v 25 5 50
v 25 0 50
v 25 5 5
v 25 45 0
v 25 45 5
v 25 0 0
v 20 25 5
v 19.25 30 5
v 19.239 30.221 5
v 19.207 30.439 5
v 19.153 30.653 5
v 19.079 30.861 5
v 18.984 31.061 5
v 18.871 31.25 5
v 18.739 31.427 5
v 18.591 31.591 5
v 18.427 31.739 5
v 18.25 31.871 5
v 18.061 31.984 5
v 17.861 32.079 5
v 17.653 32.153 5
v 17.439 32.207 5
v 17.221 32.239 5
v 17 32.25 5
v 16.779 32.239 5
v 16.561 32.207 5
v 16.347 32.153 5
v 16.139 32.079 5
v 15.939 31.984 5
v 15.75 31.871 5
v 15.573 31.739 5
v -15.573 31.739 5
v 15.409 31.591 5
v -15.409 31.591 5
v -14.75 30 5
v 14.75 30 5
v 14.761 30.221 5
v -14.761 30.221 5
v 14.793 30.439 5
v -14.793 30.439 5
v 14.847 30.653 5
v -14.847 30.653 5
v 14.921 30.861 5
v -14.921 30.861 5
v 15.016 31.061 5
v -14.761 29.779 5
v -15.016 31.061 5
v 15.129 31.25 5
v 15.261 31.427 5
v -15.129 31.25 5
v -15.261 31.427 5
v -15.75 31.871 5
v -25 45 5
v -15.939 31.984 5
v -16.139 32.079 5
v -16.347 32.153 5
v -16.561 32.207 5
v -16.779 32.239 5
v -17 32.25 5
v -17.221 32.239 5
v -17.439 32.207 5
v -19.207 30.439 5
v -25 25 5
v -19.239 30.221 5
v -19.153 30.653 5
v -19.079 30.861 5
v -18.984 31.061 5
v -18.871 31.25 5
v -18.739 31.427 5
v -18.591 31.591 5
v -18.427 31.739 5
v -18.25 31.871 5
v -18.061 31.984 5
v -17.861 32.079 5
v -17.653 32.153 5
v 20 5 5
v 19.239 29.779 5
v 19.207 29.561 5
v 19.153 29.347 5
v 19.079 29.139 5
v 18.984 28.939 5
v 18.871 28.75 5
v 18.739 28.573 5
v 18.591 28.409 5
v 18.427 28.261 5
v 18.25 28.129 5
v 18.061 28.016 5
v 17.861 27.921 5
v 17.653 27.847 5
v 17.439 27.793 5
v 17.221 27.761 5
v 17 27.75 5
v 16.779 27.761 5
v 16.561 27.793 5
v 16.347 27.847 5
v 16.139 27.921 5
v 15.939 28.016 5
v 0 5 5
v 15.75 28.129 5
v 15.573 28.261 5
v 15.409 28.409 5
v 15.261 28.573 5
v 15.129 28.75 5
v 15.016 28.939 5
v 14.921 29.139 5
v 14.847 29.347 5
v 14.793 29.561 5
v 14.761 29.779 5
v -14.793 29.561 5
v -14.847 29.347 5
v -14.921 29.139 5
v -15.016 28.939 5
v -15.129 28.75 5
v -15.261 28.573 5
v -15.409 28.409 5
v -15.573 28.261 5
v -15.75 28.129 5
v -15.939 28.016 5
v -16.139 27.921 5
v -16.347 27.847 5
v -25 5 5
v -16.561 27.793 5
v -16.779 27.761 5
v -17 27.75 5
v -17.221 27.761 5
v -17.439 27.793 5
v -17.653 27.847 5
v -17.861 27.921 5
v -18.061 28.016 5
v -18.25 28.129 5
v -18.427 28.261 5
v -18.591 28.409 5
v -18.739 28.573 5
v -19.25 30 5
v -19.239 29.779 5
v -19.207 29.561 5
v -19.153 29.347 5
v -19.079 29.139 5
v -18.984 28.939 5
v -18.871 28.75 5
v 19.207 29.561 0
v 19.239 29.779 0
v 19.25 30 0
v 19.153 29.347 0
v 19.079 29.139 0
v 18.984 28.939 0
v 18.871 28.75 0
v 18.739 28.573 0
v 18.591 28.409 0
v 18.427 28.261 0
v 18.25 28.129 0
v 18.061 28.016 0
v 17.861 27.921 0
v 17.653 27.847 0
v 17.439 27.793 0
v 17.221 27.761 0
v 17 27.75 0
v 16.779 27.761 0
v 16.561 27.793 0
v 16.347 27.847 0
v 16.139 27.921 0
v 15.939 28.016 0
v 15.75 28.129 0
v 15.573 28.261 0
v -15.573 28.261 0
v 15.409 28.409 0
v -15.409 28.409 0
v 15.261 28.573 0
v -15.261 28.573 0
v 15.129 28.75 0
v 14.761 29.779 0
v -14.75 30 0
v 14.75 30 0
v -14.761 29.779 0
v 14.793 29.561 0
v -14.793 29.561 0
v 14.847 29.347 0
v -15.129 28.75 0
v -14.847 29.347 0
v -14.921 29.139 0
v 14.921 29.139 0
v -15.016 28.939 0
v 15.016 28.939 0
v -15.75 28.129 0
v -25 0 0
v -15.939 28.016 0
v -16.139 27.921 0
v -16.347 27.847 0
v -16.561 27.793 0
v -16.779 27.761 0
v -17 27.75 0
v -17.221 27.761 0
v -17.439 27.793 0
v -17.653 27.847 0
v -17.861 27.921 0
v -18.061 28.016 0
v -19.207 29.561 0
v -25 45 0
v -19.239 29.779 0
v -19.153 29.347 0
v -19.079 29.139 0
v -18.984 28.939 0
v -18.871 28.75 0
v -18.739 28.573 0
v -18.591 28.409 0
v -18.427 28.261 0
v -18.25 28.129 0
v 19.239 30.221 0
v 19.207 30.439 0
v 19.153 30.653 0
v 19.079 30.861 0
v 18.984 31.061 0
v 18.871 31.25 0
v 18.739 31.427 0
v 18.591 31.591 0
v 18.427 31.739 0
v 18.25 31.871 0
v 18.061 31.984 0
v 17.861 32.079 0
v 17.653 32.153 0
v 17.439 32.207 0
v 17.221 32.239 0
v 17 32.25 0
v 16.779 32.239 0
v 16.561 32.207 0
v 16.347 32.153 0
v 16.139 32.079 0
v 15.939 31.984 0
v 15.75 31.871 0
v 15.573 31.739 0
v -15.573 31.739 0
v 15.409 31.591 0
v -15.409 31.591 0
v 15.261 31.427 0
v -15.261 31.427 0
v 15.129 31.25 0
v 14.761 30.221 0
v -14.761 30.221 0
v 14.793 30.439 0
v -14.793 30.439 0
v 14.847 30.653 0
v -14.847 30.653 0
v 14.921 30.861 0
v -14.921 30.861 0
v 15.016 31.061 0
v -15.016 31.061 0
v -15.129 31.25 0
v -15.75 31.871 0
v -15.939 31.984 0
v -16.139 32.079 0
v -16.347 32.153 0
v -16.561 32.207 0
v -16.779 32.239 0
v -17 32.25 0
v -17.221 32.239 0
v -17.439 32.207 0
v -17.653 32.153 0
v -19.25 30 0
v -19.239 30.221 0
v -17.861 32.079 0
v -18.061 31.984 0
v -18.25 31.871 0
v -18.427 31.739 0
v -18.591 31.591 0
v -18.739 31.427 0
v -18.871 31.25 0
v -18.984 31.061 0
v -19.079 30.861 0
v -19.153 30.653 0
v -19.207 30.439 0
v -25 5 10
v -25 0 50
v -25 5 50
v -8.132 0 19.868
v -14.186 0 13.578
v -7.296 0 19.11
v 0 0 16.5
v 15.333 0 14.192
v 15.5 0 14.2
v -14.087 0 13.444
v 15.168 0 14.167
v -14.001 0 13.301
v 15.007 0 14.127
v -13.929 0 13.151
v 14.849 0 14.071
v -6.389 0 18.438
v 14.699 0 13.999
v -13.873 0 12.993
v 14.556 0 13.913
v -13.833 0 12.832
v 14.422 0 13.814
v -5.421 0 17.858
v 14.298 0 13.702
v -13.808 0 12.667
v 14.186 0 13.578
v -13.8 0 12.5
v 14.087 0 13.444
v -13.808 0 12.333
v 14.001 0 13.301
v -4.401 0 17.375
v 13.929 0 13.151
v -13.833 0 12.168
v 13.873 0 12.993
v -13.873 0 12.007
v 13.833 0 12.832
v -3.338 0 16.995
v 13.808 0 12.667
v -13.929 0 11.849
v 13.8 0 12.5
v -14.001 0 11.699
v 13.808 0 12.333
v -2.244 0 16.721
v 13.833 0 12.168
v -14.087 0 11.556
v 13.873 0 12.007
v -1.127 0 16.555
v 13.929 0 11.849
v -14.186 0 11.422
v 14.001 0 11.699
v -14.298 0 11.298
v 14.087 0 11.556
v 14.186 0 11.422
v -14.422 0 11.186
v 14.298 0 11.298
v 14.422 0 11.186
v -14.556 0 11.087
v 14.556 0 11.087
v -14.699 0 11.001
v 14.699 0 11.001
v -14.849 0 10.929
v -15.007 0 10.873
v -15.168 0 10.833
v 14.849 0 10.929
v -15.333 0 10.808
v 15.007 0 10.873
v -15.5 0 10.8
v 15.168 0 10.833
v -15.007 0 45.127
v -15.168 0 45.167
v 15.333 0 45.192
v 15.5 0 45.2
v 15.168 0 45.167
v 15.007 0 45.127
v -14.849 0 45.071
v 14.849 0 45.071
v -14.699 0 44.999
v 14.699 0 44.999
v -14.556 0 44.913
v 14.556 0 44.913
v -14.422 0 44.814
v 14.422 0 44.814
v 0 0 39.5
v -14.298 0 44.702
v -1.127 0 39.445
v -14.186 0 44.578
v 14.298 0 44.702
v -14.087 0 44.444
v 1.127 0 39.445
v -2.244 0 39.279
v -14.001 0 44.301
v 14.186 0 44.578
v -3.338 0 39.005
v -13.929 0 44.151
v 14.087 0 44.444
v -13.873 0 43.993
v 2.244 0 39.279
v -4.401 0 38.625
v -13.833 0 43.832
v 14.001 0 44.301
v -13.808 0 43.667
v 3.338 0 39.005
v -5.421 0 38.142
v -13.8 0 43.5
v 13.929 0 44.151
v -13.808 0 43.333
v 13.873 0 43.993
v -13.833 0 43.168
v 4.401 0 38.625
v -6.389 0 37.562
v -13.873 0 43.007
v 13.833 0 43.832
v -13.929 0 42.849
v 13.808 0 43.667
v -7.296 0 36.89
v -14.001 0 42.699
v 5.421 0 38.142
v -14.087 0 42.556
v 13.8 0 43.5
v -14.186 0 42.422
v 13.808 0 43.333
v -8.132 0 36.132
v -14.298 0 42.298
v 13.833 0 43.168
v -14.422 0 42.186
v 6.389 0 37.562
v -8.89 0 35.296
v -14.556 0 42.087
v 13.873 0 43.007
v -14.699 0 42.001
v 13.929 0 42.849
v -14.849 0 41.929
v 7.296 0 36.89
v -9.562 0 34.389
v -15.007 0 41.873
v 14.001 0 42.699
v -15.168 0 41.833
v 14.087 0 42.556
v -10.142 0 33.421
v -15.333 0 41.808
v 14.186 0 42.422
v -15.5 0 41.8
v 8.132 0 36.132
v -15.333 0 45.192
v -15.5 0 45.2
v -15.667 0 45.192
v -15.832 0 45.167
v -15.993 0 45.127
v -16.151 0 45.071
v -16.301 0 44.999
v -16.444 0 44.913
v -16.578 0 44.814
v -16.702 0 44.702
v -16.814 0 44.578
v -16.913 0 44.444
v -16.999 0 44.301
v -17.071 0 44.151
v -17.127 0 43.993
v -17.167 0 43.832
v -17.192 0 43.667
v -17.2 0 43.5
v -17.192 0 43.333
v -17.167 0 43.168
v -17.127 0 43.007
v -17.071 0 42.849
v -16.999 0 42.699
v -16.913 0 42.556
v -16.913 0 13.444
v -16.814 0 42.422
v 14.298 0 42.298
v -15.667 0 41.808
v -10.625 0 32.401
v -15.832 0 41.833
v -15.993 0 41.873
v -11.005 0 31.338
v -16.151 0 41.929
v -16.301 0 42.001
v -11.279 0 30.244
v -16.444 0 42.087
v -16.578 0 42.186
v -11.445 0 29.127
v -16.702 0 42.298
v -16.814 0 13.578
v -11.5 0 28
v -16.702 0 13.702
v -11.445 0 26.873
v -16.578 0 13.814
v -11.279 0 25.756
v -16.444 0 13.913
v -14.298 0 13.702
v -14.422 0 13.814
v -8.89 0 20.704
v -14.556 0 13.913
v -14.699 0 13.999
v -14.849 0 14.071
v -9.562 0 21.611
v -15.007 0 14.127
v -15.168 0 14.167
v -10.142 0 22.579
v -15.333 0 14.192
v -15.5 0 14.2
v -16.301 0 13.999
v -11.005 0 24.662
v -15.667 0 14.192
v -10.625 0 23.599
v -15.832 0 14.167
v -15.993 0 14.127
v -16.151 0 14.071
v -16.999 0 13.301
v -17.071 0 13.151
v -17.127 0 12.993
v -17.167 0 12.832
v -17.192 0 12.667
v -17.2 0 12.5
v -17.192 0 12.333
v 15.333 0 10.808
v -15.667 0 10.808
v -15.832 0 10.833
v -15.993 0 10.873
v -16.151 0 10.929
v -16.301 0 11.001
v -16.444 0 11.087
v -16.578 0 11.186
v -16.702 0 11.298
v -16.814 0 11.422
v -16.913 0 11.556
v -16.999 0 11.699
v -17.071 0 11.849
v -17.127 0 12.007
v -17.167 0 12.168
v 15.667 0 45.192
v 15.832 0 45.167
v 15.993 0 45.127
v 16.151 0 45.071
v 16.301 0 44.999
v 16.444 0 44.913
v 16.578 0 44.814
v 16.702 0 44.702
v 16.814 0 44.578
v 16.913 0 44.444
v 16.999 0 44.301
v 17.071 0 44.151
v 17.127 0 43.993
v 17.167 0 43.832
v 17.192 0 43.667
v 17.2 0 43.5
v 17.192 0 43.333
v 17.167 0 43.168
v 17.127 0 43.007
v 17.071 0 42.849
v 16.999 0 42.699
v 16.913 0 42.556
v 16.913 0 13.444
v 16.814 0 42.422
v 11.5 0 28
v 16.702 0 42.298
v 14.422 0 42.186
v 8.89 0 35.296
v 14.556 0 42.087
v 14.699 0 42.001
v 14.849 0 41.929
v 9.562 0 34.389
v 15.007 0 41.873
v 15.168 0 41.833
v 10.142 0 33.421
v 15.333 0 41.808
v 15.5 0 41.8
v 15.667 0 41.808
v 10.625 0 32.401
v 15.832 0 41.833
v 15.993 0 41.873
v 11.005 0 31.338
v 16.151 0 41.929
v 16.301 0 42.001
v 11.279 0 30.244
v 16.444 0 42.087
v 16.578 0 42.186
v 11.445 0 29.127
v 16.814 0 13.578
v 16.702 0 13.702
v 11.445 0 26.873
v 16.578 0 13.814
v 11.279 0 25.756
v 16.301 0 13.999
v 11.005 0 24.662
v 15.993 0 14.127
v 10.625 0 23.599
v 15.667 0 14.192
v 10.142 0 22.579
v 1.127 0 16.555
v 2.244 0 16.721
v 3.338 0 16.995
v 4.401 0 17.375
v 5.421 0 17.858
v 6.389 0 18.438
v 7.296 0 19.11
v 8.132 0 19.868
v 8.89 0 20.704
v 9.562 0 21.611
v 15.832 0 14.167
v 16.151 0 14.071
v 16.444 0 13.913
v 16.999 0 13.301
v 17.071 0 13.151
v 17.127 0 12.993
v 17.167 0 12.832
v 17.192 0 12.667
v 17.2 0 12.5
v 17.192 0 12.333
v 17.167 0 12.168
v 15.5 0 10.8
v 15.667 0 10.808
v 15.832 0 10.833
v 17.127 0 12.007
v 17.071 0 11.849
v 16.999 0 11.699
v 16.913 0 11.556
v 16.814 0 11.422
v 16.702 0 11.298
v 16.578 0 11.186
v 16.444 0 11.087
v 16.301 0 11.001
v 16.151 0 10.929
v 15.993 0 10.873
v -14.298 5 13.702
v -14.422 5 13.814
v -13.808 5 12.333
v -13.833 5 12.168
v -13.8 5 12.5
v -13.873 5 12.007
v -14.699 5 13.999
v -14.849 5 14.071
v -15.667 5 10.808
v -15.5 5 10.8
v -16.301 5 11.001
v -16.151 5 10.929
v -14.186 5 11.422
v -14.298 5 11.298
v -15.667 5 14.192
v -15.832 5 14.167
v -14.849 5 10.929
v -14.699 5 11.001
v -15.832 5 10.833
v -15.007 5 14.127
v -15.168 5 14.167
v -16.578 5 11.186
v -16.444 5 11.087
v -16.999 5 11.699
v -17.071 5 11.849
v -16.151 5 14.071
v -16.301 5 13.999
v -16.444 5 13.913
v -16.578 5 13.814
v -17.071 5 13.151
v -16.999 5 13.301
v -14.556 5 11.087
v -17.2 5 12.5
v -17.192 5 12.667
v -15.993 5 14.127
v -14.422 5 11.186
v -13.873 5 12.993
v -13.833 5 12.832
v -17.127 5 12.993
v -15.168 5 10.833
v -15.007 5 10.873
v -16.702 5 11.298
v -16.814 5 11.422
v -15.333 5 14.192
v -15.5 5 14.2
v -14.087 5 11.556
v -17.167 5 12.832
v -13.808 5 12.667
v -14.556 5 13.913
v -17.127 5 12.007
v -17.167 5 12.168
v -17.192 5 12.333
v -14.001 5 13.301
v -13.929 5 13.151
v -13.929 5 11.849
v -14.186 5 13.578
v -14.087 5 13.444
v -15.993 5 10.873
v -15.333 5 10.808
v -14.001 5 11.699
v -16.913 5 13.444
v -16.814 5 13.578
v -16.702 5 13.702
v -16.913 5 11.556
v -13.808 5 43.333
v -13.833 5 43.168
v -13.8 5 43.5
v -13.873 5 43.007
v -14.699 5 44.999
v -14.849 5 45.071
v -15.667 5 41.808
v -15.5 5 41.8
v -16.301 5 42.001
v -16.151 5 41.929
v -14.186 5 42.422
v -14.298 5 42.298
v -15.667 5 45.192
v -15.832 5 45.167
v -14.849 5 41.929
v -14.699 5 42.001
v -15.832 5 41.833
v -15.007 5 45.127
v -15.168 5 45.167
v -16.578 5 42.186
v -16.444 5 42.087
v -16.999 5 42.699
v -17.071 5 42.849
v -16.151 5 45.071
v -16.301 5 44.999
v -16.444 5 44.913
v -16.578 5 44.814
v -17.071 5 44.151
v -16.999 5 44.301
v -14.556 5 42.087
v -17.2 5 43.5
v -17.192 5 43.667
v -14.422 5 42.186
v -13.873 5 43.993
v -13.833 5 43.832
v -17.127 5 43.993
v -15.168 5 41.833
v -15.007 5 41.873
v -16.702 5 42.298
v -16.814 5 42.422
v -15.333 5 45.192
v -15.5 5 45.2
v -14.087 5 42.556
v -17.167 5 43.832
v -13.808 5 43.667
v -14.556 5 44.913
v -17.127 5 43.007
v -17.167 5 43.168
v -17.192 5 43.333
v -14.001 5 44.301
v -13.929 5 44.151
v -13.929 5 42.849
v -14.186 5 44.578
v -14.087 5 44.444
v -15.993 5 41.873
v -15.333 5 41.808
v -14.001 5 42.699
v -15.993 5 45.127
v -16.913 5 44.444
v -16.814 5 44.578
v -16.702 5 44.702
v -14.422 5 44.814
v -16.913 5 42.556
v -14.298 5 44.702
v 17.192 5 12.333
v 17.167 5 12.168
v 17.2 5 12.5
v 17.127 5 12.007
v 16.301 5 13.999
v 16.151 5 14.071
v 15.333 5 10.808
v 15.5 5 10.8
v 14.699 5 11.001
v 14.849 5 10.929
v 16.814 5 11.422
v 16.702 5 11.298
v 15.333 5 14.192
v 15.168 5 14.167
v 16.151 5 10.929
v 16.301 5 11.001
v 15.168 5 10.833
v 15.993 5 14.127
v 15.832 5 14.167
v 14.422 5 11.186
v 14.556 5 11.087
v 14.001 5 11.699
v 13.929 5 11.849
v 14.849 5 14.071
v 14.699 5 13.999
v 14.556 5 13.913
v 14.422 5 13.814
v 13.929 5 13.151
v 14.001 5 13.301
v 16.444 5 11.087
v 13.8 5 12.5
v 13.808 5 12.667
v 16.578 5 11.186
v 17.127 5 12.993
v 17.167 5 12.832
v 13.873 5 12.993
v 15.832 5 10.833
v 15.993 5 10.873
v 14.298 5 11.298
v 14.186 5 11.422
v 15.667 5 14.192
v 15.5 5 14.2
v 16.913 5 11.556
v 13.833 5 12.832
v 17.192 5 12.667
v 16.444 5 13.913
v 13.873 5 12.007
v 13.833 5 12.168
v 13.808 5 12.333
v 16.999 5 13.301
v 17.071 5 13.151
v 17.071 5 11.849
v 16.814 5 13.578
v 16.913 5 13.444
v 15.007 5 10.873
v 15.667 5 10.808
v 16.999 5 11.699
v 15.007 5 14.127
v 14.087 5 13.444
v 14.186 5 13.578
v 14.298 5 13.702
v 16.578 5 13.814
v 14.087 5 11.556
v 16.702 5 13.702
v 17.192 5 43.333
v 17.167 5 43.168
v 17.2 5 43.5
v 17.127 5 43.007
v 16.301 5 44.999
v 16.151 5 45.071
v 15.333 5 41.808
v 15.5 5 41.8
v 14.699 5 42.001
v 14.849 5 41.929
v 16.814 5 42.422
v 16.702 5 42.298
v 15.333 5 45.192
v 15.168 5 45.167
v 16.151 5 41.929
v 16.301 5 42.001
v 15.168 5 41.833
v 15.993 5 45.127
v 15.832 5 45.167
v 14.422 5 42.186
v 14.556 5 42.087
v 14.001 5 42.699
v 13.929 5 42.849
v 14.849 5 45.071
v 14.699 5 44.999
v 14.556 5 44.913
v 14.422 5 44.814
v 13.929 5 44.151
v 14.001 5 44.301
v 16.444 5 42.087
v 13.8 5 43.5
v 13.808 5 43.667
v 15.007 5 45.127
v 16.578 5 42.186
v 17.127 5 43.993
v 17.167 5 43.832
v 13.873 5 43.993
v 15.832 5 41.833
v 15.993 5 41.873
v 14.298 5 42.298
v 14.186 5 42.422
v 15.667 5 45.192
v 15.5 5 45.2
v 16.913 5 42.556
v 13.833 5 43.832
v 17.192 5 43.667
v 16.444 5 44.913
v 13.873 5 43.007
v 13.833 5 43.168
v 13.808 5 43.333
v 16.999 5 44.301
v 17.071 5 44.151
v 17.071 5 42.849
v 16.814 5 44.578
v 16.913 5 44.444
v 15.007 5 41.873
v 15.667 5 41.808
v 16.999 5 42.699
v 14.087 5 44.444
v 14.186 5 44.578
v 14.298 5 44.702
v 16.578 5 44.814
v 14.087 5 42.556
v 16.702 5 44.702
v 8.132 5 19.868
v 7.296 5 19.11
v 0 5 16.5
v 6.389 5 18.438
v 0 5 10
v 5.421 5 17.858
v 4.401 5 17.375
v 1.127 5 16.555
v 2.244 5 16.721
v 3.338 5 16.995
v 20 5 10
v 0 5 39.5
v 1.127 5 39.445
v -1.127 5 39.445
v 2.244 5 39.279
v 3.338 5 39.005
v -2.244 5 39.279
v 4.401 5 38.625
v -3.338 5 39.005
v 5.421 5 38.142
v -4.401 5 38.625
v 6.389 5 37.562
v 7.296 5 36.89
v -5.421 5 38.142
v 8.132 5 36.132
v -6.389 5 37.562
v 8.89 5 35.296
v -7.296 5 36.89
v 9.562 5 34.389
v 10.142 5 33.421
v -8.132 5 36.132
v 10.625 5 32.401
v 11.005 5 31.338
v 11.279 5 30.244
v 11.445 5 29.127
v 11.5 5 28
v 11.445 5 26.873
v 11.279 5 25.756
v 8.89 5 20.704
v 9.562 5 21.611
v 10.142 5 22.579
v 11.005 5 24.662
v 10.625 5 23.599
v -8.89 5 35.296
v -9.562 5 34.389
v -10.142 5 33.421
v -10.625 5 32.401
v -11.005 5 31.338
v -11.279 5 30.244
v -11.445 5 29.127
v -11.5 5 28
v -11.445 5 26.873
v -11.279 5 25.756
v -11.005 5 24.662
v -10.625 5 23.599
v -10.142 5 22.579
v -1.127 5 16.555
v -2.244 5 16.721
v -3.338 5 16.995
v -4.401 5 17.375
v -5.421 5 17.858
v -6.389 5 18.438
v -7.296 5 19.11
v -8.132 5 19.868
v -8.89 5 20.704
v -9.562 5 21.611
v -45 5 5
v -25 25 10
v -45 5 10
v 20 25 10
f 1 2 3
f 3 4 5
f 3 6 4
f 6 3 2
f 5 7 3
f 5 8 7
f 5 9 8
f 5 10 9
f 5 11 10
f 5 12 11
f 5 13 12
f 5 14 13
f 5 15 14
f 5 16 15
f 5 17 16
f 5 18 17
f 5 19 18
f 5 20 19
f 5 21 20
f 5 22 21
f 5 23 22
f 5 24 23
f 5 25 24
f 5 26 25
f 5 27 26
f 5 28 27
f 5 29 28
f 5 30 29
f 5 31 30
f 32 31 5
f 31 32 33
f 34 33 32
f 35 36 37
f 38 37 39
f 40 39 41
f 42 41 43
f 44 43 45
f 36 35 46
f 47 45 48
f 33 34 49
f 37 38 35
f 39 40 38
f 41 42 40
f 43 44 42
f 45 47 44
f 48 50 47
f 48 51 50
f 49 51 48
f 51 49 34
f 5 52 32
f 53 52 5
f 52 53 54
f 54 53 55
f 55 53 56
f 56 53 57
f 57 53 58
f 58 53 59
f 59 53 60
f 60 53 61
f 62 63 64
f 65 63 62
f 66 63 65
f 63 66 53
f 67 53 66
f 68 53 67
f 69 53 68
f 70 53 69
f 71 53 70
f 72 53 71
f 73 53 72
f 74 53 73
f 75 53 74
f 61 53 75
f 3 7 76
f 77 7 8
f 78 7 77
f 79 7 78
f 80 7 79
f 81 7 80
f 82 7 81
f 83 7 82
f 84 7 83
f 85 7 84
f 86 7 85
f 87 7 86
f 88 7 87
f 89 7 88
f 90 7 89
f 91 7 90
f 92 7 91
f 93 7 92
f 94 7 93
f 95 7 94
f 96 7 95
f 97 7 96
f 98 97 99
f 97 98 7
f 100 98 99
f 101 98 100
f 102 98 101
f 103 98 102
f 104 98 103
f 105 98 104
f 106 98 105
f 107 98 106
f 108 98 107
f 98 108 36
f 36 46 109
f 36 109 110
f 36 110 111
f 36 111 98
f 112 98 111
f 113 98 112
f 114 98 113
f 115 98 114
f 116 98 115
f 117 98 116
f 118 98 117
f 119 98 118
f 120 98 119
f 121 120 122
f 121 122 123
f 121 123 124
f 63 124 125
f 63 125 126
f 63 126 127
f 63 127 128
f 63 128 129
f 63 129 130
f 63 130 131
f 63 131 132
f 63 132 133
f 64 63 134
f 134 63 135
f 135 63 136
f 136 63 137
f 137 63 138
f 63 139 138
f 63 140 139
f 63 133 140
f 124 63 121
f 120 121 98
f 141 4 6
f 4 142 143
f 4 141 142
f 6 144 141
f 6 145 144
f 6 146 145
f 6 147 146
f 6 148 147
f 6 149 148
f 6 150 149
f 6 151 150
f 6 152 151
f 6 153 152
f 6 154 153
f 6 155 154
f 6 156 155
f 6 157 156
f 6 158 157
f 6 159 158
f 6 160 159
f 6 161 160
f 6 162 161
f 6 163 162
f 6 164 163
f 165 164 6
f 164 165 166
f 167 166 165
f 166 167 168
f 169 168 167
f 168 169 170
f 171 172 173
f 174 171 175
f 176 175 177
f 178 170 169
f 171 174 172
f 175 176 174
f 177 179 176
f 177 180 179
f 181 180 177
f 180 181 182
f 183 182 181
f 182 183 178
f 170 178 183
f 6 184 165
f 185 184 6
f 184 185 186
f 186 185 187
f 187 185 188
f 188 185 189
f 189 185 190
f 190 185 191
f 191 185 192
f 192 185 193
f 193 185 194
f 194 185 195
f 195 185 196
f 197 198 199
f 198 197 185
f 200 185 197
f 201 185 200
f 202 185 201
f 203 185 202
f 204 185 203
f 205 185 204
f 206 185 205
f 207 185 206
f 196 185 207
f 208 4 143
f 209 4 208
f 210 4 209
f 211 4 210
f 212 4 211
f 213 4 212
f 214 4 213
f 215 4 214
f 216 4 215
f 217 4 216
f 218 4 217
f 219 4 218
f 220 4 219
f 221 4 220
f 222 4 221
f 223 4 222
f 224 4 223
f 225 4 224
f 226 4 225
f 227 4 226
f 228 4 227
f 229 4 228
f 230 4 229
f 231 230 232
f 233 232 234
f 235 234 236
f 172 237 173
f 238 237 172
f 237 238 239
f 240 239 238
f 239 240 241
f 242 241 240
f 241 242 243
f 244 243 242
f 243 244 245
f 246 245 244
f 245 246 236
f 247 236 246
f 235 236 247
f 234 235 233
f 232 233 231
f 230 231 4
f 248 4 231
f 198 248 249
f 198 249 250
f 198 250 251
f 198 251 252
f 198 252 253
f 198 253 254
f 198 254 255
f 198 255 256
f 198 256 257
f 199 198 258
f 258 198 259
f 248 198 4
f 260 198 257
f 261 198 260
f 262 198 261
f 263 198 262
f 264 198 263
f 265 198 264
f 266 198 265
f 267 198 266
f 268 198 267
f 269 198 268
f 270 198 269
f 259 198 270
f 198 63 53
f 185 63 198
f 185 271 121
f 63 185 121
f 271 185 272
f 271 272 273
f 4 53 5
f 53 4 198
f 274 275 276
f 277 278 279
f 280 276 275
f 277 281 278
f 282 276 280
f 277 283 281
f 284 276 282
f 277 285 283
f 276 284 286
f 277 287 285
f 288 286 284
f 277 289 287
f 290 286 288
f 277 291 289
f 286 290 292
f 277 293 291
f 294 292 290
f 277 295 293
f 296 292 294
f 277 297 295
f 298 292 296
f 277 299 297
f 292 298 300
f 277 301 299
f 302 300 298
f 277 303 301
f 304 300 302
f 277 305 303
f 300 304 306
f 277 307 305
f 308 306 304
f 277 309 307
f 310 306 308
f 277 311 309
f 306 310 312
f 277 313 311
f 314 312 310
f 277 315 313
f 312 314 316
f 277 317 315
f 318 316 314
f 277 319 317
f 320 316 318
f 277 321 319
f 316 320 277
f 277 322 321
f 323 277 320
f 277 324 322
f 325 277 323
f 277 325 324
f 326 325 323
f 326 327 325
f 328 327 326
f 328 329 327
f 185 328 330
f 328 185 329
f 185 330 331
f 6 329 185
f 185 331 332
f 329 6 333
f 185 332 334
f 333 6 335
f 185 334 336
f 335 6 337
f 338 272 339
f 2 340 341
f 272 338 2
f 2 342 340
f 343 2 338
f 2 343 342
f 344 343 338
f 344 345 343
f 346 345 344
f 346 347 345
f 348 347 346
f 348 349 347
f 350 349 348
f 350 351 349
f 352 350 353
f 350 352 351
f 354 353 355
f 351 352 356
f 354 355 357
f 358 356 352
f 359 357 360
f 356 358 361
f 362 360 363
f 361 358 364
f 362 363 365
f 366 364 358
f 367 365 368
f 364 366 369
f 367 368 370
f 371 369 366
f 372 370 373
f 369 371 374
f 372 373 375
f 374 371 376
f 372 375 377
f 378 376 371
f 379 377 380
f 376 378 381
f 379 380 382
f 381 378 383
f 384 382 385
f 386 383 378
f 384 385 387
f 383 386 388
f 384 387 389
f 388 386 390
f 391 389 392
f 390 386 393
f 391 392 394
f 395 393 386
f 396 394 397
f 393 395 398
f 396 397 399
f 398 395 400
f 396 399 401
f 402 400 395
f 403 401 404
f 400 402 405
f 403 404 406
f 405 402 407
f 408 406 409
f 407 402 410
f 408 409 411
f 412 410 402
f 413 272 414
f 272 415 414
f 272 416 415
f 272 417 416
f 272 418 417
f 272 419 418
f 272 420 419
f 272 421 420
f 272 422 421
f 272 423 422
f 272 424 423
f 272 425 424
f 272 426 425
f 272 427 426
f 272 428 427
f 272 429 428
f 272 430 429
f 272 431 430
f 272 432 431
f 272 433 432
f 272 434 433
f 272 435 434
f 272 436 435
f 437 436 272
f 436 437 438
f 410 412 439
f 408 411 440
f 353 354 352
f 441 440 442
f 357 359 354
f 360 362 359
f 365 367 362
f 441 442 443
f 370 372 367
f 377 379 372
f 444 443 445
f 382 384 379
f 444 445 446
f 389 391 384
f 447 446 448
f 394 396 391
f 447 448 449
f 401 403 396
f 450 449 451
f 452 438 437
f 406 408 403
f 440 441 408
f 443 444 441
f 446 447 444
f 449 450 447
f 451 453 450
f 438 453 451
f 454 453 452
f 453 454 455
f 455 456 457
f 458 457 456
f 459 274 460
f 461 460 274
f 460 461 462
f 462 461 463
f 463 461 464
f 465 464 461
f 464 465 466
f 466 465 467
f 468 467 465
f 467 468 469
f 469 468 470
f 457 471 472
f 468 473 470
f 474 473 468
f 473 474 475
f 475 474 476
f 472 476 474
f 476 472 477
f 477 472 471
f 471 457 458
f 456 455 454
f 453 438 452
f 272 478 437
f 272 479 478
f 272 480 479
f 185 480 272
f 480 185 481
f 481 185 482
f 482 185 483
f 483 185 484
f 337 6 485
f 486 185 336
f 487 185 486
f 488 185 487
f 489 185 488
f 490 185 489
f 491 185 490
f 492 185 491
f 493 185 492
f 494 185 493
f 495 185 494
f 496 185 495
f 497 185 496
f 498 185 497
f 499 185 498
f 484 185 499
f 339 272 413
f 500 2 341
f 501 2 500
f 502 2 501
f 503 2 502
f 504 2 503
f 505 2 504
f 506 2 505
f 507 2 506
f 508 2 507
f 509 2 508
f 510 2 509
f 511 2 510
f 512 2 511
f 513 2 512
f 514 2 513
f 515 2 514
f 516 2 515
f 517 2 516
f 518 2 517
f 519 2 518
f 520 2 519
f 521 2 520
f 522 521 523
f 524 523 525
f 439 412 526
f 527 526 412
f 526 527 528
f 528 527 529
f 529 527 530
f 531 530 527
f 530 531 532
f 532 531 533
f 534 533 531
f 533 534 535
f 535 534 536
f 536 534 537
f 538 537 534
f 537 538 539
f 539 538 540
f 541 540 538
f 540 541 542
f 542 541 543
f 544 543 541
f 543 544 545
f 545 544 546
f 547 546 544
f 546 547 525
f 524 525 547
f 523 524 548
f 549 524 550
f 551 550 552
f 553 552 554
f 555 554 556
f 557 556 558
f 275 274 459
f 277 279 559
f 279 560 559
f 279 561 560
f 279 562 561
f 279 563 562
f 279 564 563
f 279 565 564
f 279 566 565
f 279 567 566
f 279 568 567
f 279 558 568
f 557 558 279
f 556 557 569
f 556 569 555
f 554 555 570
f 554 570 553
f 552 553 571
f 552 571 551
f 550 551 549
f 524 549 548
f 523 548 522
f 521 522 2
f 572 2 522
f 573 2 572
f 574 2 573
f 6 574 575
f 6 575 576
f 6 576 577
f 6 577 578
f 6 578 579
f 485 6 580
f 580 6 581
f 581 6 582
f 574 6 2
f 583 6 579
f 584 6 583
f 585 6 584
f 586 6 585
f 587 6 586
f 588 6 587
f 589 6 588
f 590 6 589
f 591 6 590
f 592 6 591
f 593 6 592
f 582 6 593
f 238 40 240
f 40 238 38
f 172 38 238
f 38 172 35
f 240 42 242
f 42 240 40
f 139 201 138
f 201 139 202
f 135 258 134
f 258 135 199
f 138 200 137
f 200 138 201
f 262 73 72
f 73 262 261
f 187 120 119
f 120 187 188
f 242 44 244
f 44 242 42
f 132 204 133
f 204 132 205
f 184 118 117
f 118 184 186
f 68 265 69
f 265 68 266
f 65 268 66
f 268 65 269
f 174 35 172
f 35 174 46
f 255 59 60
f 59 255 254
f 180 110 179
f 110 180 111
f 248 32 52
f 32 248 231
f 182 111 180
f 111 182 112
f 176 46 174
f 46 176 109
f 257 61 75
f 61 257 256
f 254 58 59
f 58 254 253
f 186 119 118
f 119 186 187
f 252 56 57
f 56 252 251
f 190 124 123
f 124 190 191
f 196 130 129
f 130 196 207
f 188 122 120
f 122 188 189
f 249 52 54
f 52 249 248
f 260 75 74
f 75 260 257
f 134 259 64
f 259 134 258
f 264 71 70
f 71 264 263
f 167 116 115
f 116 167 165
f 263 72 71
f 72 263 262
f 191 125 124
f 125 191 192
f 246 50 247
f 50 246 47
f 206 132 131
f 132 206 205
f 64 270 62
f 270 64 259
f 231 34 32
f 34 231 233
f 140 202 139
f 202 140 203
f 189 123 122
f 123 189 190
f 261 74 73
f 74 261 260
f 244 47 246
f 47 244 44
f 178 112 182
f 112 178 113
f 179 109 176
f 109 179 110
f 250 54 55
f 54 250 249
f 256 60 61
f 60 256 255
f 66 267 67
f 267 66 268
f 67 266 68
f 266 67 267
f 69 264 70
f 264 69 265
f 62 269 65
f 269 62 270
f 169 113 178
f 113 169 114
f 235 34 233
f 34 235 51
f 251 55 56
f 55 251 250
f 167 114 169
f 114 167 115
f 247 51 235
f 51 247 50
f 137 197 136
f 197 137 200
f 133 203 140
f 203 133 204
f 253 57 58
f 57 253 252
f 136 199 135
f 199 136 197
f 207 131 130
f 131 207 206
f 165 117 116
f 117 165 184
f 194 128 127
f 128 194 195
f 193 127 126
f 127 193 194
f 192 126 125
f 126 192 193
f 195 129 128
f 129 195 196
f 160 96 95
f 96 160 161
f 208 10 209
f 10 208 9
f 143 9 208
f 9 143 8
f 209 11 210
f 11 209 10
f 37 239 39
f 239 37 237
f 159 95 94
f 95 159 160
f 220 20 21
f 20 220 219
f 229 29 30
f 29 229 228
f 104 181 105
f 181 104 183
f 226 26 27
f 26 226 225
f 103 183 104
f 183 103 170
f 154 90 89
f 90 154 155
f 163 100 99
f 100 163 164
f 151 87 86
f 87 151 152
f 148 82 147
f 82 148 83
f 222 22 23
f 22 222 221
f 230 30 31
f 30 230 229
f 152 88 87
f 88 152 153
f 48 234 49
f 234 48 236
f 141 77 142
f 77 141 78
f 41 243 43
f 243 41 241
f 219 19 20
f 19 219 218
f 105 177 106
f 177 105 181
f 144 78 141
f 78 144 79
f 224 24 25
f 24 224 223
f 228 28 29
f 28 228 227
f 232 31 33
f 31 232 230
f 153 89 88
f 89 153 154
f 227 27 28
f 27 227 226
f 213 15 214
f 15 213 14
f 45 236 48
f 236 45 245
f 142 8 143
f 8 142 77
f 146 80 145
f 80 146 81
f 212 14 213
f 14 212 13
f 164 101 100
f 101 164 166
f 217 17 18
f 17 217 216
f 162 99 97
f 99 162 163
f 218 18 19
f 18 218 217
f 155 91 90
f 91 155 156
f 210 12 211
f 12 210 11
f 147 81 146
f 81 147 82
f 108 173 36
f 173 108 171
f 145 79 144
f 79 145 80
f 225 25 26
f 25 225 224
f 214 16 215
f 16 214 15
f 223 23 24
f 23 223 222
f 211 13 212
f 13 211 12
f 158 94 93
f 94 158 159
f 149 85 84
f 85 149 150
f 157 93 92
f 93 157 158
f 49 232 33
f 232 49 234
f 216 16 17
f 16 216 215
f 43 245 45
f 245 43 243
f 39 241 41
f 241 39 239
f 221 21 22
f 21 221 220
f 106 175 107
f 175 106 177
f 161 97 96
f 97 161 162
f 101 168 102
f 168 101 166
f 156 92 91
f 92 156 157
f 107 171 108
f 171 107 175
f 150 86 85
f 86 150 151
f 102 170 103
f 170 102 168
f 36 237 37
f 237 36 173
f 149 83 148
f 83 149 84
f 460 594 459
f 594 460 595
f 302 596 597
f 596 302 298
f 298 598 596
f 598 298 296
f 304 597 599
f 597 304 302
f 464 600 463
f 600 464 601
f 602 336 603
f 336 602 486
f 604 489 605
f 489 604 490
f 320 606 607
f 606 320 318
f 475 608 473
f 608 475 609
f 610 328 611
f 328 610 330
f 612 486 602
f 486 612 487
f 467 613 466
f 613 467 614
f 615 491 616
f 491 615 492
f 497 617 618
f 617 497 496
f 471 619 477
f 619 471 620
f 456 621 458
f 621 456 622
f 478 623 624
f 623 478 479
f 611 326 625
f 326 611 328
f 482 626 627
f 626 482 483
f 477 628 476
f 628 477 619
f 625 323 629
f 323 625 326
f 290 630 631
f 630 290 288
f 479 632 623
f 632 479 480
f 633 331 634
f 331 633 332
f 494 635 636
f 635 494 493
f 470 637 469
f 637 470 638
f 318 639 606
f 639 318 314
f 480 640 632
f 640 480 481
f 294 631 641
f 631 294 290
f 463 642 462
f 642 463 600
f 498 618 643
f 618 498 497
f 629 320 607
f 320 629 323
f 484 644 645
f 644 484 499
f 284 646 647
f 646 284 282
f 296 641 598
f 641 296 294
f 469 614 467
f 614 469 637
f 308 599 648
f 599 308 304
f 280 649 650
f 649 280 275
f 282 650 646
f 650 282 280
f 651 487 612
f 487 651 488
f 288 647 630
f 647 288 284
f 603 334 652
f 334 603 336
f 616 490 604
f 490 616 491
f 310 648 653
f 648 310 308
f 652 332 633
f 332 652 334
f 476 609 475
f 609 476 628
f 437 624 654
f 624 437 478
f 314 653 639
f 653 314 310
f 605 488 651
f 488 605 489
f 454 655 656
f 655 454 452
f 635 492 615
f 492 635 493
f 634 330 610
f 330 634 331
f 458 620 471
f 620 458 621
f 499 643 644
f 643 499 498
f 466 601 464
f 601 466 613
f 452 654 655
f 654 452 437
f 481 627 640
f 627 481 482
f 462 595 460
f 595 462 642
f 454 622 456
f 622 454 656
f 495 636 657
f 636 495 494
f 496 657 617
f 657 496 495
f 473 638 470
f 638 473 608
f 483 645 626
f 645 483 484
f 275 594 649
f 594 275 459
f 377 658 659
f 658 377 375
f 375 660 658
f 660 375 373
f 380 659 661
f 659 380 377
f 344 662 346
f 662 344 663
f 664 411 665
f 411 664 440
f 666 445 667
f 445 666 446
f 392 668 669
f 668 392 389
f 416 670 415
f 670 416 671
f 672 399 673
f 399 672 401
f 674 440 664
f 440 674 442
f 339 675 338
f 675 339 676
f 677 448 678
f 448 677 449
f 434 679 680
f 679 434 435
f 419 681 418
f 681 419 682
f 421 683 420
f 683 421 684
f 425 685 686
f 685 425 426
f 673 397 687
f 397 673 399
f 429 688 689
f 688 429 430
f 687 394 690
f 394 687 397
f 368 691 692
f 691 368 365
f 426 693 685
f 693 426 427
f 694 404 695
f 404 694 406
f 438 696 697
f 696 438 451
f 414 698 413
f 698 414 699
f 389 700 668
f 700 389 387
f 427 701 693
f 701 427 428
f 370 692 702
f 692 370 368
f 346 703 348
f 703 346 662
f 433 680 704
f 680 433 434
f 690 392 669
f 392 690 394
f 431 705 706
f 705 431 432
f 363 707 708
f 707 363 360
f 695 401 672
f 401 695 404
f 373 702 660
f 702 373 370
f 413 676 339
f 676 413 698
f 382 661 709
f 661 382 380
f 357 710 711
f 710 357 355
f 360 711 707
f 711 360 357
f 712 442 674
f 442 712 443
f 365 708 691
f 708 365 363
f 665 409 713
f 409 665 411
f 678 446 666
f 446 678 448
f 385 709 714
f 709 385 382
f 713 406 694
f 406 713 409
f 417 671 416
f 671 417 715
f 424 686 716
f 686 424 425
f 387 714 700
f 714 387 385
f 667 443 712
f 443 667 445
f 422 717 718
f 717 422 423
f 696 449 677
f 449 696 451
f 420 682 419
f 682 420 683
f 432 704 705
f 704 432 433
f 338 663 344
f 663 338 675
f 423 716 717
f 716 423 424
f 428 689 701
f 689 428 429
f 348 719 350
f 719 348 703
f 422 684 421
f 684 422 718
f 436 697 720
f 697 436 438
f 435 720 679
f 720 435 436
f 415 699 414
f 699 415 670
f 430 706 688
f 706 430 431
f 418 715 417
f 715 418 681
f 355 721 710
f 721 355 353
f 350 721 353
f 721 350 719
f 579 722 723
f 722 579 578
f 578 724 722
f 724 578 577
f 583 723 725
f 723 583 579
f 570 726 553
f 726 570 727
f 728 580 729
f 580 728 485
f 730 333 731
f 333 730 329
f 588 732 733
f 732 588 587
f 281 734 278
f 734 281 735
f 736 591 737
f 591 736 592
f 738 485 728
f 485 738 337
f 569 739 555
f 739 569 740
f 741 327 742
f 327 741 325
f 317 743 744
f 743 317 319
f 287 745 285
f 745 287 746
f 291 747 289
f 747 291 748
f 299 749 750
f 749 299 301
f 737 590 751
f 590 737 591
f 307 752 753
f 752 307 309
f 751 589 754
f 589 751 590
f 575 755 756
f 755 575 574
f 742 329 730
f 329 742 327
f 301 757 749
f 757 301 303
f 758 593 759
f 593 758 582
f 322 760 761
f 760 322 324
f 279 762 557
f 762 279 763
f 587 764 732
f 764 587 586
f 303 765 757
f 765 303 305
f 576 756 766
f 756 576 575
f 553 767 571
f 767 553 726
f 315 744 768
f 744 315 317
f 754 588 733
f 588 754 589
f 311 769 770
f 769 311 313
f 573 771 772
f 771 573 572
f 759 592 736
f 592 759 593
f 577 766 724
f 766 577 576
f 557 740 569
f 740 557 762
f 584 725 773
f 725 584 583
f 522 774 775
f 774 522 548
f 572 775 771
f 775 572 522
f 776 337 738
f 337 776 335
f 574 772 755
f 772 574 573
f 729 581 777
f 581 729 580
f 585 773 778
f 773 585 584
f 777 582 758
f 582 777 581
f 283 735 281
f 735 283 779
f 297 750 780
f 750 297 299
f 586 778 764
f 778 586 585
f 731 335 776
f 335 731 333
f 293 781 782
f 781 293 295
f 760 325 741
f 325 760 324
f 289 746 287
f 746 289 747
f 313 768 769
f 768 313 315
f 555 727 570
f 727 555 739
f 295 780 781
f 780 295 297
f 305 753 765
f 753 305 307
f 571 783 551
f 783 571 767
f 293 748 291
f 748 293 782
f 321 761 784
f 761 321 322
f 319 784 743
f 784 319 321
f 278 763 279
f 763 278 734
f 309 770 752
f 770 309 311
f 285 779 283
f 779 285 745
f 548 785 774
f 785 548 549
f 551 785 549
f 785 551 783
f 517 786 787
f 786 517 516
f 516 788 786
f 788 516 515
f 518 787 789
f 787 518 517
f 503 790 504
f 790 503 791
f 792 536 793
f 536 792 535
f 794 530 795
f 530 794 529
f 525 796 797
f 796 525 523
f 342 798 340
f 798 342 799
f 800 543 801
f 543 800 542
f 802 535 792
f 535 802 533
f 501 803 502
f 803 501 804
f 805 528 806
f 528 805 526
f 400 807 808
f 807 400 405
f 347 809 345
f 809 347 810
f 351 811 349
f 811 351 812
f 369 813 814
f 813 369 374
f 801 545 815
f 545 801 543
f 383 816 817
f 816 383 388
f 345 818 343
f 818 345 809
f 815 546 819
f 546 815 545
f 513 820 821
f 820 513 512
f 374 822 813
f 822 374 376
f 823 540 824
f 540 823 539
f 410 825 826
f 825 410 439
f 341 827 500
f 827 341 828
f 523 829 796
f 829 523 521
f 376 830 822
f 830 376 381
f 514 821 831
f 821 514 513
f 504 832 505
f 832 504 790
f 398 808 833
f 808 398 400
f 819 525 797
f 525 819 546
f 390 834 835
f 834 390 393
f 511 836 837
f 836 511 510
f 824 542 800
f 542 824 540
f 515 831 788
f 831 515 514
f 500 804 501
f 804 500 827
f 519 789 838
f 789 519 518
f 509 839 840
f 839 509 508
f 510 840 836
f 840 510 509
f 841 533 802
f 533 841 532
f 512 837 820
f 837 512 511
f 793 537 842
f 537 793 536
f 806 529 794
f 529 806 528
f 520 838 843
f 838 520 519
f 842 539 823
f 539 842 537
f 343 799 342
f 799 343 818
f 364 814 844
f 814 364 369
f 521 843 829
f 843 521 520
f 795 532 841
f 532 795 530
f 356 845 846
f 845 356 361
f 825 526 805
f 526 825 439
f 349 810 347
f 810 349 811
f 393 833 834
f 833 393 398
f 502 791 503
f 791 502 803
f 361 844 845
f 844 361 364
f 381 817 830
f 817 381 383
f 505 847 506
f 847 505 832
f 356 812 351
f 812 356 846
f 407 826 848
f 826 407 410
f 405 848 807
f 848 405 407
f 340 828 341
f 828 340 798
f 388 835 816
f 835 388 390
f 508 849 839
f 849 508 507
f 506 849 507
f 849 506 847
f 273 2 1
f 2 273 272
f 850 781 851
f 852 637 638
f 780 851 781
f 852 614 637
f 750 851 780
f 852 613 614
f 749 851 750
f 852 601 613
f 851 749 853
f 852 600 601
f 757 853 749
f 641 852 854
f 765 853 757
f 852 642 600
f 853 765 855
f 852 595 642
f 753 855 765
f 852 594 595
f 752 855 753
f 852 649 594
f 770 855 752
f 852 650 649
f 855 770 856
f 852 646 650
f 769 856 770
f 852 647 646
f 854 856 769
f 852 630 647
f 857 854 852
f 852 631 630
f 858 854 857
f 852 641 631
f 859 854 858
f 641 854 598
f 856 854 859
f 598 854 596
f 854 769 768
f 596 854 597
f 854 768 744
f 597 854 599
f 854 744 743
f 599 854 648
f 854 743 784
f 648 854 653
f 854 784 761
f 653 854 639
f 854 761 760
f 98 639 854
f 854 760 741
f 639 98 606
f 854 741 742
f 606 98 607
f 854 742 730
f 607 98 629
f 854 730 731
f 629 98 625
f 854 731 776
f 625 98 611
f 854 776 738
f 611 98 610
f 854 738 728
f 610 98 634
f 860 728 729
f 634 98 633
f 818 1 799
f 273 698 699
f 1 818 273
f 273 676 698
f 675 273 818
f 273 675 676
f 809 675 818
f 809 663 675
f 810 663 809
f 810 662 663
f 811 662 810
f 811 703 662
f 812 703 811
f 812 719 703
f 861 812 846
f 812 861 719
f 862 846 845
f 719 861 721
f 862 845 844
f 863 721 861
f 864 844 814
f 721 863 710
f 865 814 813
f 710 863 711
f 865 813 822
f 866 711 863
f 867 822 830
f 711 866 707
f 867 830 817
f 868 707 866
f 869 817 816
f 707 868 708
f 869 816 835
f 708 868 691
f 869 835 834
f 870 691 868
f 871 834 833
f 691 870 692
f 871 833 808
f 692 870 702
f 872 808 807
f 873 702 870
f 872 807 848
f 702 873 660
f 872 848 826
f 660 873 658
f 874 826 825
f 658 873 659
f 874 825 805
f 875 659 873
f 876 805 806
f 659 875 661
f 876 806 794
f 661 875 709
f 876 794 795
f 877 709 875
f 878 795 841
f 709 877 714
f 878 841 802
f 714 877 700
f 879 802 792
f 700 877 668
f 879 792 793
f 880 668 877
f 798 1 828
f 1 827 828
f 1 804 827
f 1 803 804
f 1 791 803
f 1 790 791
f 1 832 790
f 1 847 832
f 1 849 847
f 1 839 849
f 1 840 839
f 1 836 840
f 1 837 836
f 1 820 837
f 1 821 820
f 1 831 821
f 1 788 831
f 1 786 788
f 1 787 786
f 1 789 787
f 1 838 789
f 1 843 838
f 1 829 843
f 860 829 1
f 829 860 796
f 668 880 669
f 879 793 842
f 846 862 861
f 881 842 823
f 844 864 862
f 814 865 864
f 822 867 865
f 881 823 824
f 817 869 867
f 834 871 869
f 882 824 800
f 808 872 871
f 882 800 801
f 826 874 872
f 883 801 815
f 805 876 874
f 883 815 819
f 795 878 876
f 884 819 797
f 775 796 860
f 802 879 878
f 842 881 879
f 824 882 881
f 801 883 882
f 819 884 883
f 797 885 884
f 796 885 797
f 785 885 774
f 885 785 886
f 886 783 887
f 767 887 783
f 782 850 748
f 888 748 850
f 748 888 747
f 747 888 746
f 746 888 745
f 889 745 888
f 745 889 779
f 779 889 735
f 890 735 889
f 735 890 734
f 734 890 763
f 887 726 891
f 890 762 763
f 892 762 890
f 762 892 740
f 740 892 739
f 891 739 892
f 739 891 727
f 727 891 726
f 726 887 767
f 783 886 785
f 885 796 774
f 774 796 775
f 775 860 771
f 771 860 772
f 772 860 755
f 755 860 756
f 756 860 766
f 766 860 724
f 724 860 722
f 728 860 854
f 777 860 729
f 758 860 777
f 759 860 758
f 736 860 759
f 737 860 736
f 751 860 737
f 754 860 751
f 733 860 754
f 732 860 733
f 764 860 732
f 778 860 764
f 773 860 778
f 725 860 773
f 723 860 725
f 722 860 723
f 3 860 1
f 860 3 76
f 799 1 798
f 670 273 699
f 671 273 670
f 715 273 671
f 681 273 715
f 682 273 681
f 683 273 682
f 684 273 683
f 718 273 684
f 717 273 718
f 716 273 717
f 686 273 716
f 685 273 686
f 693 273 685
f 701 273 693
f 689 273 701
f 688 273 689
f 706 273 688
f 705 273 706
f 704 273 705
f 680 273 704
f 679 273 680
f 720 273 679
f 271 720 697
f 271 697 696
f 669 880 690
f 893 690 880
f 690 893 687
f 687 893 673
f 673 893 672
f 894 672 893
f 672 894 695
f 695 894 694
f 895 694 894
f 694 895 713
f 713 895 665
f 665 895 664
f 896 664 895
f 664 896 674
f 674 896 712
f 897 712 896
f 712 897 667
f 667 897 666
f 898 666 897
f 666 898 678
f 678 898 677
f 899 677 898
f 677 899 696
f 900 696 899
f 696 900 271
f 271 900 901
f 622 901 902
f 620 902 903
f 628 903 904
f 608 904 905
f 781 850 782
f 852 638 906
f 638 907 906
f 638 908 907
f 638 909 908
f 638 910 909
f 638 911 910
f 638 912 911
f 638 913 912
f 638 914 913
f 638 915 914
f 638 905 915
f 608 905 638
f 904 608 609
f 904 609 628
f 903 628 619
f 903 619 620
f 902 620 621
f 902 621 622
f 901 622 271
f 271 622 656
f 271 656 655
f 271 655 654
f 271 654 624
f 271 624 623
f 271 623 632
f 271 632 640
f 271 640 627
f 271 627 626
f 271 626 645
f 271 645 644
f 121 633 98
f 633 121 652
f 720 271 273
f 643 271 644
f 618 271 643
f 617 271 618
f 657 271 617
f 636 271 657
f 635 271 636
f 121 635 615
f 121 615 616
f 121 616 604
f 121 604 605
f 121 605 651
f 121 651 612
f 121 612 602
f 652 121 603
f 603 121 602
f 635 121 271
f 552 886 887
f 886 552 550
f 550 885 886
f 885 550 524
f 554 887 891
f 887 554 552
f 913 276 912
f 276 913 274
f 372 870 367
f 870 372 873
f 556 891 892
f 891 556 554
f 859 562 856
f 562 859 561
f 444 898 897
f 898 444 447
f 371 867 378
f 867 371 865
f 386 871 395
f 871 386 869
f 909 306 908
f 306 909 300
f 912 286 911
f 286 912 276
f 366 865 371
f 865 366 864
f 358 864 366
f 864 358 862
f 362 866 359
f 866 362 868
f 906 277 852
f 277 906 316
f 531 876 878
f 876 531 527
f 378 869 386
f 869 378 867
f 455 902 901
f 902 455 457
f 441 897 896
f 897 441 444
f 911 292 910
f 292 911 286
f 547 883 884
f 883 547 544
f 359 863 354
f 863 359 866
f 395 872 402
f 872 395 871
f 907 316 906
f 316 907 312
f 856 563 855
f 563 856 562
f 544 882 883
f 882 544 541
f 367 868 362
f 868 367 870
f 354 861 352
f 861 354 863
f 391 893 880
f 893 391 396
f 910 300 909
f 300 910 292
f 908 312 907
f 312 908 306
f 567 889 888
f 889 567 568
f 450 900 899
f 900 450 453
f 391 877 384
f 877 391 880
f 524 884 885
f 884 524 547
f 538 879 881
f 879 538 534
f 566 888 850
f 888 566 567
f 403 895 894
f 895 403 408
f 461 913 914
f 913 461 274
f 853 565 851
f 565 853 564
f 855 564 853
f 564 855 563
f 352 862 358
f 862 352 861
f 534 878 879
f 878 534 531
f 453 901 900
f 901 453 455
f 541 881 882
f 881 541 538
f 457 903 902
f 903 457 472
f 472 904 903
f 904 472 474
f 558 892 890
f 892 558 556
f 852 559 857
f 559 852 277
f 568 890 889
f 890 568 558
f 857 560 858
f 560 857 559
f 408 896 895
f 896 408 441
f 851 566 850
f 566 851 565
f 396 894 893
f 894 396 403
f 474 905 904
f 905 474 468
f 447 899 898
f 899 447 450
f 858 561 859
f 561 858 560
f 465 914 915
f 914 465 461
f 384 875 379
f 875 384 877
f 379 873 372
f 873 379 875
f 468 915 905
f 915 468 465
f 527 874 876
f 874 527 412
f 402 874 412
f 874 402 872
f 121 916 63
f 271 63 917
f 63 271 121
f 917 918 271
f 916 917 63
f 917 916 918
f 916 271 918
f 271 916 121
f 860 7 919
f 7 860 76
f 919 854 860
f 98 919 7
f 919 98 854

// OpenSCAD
// L-Shaped NEMA 17 Motor Bracket for Syringe Pump
// Print Orientation: Base plate on XY plane (Z=0)

// --- Dimensions ---
// Base Plate
base_width_x = 50;           // From -25 to 25
base_depth_y = 45;           // From 0 to 45
base_height_z = 5;           // Thickness of base
base_hole_dia = 4.5;         // M4 through-holes
base_hole_x1 = -17;          // X position of hole 1
base_hole_x2 = 17;           // X position of hole 2
base_hole_y = 30;            // Y position of holes

// Vertical Motor Plate
motor_plate_width_x = 50;    // From -25 to 25
motor_plate_depth_y = 5;     // Thickness of vertical plate
motor_plate_height_z = 50;   // Total height from Z=0
motor_boss_dia = 23;         // Centering boss hole diameter
motor_boss_x = 0;            // Center X
motor_boss_z = 28;           // Center Z
motor_screw_dia = 3.4;       // M3 screw holes
motor_screw_pattern = 31;    // Square pattern for M3 screws

// Gussets
gusset_thickness = 5;        // Thickness of gussets
gusset_leg_y = 20;           // Leg length along Y
gusset_leg_z = 20;           // Leg length along Z
gusset_x_outer = 25;         // Outer edge X
gusset_x_inner = 20;         // Inner edge X

// --- Constants ---
$fn = 64;
eps = 0.1; // Overlap for clean boolean operations

// --- Main Assembly ---

union() {
    // 1. Base Plate
    difference() {
        // Main body: x from -25 to 25, y from 0 to 45, z from 0 to 5
        translate([-base_width_x/2, 0, 0])
            cube([base_width_x, base_depth_y, base_height_z]);
        
        // M4 Through-holes: 4.5 mm vertical through-holes at (x = -17, y = 30) and (x = 17, y = 30)
        translate([base_hole_x1, base_hole_y, -eps])
            cylinder(h = base_height_z + 2*eps, d = base_hole_dia);
        translate([base_hole_x2, base_hole_y, -eps])
            cylinder(h = base_height_z + 2*eps, d = base_hole_dia);
    }

    // 2. Vertical Motor Plate
    difference() {
        // Main body: x from -25 to 25, y from 0 to 5, z from 0 to 50
        translate([-motor_plate_width_x/2, 0, 0])
            cube([motor_plate_width_x, motor_plate_depth_y, motor_plate_height_z]);
        
        // Motor Centering Boss Hole: 23 mm hole, center x=0, z=28, along Y
        translate([motor_boss_x, -eps, motor_boss_z])
            rotate([-90, 0, 0])
            cylinder(h = motor_plate_depth_y + 2*eps, d = motor_boss_dia);
        
        // M3 Screw Holes: 3.4 mm holes on a 31 mm square pattern centered on boss
        for (sx = [-1, 1], sz = [-1, 1]) {
            translate([motor_boss_x + sx * (motor_screw_pattern/2), -eps, motor_boss_z + sz * (motor_screw_pattern/2)])
                rotate([-90, 0, 0])
                cylinder(h = motor_plate_depth_y + 2*eps, d = motor_screw_dia);
        }
    }

    // 3. Gussets
    // Each is a right triangle in the YZ plane with legs 20 mm along +Y and +Z.
    // Right-angle corner at y = 5, z = 5.
    // Flush with the left and right edges (x = -25 to -20 and x = 20 to 25).
    
    // Left Gusset (X: -25 to -20)
    // We define the triangle in YZ and extrude along X.
    // To be flush with X=-25 and X=-20, we translate to -25 and extrude 5.
    translate([-25, 5, 5])
    rotate([0, 0, 90]) 
    linear_extrude(height = gusset_thickness)
    polygon(points = [
        [0, 0],               // Corner (Y=5, Z=5)
        [gusset_leg_y, 0],    // End of Y leg (Y=5+20=25)
        [0, gusset_leg_z]     // End of Z leg (Z=5+20=25)
    ]);

    // Right Gusset (X: 20 to 25)
    translate([20, 5, 5])
    rotate([0, 0, 90])
    linear_extrude(height = gusset_thickness)
    polygon(points = [
        [0, 0],               // Corner (Y=5, Z=5)
        [gusset_leg_y, 0],    // End of Y leg
        [0, gusset_leg_z]     // End of Z leg
    ]);
}
